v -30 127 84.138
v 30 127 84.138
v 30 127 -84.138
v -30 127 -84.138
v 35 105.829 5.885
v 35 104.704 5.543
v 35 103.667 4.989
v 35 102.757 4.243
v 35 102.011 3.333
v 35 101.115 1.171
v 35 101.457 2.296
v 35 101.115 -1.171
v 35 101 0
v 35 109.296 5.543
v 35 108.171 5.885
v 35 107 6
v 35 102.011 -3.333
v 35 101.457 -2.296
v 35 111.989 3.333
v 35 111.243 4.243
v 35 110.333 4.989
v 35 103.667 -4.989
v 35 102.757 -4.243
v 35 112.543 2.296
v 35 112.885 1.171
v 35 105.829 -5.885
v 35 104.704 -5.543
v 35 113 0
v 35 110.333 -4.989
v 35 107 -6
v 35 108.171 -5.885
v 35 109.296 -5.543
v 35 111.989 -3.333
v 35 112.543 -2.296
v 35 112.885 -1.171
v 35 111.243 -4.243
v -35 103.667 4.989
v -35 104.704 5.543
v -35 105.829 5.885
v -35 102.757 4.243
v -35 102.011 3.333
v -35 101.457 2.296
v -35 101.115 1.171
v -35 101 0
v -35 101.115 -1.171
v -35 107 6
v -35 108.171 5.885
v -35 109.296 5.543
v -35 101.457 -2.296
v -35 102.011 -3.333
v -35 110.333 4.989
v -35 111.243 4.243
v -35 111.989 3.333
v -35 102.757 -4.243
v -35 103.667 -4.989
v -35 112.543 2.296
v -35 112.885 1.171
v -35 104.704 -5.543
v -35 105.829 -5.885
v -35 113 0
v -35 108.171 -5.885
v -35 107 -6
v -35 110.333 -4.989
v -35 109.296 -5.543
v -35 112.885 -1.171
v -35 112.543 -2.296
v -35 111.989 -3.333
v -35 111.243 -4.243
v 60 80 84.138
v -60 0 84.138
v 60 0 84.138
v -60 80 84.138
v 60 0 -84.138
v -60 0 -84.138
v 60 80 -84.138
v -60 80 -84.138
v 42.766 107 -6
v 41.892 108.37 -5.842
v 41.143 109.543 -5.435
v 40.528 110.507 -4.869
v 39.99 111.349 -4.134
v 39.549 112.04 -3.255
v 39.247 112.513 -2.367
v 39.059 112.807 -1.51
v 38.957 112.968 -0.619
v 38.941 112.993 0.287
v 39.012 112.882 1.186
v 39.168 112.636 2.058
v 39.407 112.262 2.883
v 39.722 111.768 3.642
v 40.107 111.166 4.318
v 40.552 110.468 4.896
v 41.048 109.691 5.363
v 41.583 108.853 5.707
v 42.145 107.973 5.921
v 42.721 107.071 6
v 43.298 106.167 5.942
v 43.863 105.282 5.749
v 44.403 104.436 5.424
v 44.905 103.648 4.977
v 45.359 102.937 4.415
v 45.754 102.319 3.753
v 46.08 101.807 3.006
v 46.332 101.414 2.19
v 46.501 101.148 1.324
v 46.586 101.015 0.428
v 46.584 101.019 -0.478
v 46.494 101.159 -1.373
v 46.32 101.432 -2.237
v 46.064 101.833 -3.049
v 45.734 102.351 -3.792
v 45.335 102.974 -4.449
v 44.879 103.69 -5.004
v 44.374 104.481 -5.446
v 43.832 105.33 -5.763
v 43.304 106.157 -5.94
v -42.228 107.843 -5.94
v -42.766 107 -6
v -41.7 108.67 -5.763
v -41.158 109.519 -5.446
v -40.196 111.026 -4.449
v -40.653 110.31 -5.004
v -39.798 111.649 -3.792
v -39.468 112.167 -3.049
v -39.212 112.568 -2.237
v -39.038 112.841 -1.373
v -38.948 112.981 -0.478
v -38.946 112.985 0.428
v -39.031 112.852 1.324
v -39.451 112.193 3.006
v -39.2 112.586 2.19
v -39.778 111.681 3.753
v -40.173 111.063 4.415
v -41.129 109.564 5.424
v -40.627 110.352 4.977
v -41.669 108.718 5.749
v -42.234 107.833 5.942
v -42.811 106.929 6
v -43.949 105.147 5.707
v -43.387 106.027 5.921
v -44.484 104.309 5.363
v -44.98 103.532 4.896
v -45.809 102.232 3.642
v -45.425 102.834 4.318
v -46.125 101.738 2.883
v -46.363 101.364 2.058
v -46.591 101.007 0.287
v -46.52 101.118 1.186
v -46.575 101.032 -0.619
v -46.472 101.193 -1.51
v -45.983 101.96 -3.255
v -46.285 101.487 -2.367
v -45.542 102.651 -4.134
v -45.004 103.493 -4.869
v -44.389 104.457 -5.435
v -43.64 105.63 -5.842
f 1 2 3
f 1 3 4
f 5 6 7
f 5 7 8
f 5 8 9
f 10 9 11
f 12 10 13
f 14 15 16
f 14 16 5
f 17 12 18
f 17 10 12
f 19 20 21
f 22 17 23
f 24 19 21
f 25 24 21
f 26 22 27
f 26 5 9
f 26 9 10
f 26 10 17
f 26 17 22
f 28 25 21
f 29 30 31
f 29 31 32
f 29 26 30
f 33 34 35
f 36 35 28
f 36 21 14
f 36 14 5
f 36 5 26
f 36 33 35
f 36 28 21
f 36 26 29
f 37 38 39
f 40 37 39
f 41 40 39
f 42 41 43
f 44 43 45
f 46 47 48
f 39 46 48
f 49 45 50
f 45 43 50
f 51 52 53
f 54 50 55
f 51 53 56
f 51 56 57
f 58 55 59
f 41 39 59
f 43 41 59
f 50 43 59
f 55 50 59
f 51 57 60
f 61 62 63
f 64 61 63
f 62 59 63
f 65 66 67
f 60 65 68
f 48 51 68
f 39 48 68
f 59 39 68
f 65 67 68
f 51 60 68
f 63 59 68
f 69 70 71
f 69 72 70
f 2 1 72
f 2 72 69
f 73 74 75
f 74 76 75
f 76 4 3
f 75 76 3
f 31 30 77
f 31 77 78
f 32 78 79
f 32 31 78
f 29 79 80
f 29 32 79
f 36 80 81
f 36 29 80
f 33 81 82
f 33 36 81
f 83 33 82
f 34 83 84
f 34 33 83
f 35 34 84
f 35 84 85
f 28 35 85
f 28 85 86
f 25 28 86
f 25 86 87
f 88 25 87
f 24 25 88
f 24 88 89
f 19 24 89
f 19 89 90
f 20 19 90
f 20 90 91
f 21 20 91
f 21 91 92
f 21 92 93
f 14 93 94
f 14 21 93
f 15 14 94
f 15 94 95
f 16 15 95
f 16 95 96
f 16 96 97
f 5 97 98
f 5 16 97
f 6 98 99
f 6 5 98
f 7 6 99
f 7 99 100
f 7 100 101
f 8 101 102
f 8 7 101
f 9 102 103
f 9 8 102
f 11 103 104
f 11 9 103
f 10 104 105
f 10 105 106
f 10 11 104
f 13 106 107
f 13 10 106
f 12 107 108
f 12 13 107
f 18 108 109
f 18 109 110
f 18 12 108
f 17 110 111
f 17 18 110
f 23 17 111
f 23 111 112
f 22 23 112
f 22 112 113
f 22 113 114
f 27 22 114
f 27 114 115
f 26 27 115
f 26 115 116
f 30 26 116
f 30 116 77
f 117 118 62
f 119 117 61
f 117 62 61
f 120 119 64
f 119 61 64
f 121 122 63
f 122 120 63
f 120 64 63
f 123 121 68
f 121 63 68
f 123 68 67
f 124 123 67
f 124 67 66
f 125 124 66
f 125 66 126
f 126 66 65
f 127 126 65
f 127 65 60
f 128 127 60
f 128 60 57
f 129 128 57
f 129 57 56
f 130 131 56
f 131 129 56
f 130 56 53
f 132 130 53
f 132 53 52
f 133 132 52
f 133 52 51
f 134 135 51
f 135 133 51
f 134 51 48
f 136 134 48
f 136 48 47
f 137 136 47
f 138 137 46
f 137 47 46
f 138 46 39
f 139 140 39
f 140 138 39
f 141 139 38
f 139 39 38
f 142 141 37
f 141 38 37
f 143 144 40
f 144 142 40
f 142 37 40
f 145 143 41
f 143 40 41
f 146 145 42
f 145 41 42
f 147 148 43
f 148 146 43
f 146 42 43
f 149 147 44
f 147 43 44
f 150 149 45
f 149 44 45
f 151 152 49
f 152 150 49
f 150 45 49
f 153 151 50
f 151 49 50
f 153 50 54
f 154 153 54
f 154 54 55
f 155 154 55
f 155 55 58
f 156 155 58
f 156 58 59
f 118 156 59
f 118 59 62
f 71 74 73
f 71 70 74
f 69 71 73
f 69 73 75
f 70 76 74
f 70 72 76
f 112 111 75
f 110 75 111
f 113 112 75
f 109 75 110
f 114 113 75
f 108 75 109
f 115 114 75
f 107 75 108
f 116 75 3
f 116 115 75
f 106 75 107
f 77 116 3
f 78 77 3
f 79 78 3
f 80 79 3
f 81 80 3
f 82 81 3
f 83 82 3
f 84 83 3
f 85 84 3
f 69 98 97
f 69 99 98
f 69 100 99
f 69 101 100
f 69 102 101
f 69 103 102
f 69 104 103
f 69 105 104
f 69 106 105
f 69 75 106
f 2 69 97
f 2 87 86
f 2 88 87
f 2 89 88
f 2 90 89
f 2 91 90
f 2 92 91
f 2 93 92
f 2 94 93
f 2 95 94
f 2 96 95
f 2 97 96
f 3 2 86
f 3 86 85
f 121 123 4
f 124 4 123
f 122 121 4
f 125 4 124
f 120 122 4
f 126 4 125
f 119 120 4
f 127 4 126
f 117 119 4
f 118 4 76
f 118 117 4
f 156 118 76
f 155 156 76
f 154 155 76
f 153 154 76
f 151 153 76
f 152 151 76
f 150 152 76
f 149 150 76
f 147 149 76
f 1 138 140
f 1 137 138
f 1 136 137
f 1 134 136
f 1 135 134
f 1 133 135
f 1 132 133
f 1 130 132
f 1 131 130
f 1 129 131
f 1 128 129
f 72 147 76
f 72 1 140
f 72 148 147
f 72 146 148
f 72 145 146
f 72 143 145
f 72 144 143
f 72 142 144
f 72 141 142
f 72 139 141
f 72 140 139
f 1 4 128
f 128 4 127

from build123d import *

# Parameters (mm, degrees)
RESSALTO_EXTRUS_O1_DEPTH = 84.1375
CORTE_EXTRUS_O1_START    = -35
ESBO_O2_R                = 6
CORTE_EXTRUS_O1_DEPTH    = 26


with BuildPart() as part:
    # Esboço1 → Ressalto-extrusão1 (new body, symmetric)
    with BuildSketch(Plane.XY):
        Polygon((-60, 0), (60, 0), (60, 80), (30, 127), (-30, 127), (-60, 80), align=None)
    extrude(amount=RESSALTO_EXTRUS_O1_DEPTH, both=True)

    # Esboço2 → Corte-extrusão1 (cut, through all)
    with BuildSketch(Plane(origin=(0, 0, 0), x_dir=(0, 0, -1), z_dir=(1, 0, 0)).offset(CORTE_EXTRUS_O1_START)):
        with Locations((0, 107)):
            Circle(ESBO_O2_R)
    corte_extrus_o1 = extrude(amount=-CORTE_EXTRUS_O1_DEPTH, mode=Mode.SUBTRACT)

    # Espelhar1: Corte-extrusão1 across plane
    add(corte_extrus_o1.mirror(Plane(origin=(0, 0, 0), x_dir=(0, 0, 1), z_dir=(1, 0, 0))), mode=Mode.SUBTRACT)


solid = part.part
